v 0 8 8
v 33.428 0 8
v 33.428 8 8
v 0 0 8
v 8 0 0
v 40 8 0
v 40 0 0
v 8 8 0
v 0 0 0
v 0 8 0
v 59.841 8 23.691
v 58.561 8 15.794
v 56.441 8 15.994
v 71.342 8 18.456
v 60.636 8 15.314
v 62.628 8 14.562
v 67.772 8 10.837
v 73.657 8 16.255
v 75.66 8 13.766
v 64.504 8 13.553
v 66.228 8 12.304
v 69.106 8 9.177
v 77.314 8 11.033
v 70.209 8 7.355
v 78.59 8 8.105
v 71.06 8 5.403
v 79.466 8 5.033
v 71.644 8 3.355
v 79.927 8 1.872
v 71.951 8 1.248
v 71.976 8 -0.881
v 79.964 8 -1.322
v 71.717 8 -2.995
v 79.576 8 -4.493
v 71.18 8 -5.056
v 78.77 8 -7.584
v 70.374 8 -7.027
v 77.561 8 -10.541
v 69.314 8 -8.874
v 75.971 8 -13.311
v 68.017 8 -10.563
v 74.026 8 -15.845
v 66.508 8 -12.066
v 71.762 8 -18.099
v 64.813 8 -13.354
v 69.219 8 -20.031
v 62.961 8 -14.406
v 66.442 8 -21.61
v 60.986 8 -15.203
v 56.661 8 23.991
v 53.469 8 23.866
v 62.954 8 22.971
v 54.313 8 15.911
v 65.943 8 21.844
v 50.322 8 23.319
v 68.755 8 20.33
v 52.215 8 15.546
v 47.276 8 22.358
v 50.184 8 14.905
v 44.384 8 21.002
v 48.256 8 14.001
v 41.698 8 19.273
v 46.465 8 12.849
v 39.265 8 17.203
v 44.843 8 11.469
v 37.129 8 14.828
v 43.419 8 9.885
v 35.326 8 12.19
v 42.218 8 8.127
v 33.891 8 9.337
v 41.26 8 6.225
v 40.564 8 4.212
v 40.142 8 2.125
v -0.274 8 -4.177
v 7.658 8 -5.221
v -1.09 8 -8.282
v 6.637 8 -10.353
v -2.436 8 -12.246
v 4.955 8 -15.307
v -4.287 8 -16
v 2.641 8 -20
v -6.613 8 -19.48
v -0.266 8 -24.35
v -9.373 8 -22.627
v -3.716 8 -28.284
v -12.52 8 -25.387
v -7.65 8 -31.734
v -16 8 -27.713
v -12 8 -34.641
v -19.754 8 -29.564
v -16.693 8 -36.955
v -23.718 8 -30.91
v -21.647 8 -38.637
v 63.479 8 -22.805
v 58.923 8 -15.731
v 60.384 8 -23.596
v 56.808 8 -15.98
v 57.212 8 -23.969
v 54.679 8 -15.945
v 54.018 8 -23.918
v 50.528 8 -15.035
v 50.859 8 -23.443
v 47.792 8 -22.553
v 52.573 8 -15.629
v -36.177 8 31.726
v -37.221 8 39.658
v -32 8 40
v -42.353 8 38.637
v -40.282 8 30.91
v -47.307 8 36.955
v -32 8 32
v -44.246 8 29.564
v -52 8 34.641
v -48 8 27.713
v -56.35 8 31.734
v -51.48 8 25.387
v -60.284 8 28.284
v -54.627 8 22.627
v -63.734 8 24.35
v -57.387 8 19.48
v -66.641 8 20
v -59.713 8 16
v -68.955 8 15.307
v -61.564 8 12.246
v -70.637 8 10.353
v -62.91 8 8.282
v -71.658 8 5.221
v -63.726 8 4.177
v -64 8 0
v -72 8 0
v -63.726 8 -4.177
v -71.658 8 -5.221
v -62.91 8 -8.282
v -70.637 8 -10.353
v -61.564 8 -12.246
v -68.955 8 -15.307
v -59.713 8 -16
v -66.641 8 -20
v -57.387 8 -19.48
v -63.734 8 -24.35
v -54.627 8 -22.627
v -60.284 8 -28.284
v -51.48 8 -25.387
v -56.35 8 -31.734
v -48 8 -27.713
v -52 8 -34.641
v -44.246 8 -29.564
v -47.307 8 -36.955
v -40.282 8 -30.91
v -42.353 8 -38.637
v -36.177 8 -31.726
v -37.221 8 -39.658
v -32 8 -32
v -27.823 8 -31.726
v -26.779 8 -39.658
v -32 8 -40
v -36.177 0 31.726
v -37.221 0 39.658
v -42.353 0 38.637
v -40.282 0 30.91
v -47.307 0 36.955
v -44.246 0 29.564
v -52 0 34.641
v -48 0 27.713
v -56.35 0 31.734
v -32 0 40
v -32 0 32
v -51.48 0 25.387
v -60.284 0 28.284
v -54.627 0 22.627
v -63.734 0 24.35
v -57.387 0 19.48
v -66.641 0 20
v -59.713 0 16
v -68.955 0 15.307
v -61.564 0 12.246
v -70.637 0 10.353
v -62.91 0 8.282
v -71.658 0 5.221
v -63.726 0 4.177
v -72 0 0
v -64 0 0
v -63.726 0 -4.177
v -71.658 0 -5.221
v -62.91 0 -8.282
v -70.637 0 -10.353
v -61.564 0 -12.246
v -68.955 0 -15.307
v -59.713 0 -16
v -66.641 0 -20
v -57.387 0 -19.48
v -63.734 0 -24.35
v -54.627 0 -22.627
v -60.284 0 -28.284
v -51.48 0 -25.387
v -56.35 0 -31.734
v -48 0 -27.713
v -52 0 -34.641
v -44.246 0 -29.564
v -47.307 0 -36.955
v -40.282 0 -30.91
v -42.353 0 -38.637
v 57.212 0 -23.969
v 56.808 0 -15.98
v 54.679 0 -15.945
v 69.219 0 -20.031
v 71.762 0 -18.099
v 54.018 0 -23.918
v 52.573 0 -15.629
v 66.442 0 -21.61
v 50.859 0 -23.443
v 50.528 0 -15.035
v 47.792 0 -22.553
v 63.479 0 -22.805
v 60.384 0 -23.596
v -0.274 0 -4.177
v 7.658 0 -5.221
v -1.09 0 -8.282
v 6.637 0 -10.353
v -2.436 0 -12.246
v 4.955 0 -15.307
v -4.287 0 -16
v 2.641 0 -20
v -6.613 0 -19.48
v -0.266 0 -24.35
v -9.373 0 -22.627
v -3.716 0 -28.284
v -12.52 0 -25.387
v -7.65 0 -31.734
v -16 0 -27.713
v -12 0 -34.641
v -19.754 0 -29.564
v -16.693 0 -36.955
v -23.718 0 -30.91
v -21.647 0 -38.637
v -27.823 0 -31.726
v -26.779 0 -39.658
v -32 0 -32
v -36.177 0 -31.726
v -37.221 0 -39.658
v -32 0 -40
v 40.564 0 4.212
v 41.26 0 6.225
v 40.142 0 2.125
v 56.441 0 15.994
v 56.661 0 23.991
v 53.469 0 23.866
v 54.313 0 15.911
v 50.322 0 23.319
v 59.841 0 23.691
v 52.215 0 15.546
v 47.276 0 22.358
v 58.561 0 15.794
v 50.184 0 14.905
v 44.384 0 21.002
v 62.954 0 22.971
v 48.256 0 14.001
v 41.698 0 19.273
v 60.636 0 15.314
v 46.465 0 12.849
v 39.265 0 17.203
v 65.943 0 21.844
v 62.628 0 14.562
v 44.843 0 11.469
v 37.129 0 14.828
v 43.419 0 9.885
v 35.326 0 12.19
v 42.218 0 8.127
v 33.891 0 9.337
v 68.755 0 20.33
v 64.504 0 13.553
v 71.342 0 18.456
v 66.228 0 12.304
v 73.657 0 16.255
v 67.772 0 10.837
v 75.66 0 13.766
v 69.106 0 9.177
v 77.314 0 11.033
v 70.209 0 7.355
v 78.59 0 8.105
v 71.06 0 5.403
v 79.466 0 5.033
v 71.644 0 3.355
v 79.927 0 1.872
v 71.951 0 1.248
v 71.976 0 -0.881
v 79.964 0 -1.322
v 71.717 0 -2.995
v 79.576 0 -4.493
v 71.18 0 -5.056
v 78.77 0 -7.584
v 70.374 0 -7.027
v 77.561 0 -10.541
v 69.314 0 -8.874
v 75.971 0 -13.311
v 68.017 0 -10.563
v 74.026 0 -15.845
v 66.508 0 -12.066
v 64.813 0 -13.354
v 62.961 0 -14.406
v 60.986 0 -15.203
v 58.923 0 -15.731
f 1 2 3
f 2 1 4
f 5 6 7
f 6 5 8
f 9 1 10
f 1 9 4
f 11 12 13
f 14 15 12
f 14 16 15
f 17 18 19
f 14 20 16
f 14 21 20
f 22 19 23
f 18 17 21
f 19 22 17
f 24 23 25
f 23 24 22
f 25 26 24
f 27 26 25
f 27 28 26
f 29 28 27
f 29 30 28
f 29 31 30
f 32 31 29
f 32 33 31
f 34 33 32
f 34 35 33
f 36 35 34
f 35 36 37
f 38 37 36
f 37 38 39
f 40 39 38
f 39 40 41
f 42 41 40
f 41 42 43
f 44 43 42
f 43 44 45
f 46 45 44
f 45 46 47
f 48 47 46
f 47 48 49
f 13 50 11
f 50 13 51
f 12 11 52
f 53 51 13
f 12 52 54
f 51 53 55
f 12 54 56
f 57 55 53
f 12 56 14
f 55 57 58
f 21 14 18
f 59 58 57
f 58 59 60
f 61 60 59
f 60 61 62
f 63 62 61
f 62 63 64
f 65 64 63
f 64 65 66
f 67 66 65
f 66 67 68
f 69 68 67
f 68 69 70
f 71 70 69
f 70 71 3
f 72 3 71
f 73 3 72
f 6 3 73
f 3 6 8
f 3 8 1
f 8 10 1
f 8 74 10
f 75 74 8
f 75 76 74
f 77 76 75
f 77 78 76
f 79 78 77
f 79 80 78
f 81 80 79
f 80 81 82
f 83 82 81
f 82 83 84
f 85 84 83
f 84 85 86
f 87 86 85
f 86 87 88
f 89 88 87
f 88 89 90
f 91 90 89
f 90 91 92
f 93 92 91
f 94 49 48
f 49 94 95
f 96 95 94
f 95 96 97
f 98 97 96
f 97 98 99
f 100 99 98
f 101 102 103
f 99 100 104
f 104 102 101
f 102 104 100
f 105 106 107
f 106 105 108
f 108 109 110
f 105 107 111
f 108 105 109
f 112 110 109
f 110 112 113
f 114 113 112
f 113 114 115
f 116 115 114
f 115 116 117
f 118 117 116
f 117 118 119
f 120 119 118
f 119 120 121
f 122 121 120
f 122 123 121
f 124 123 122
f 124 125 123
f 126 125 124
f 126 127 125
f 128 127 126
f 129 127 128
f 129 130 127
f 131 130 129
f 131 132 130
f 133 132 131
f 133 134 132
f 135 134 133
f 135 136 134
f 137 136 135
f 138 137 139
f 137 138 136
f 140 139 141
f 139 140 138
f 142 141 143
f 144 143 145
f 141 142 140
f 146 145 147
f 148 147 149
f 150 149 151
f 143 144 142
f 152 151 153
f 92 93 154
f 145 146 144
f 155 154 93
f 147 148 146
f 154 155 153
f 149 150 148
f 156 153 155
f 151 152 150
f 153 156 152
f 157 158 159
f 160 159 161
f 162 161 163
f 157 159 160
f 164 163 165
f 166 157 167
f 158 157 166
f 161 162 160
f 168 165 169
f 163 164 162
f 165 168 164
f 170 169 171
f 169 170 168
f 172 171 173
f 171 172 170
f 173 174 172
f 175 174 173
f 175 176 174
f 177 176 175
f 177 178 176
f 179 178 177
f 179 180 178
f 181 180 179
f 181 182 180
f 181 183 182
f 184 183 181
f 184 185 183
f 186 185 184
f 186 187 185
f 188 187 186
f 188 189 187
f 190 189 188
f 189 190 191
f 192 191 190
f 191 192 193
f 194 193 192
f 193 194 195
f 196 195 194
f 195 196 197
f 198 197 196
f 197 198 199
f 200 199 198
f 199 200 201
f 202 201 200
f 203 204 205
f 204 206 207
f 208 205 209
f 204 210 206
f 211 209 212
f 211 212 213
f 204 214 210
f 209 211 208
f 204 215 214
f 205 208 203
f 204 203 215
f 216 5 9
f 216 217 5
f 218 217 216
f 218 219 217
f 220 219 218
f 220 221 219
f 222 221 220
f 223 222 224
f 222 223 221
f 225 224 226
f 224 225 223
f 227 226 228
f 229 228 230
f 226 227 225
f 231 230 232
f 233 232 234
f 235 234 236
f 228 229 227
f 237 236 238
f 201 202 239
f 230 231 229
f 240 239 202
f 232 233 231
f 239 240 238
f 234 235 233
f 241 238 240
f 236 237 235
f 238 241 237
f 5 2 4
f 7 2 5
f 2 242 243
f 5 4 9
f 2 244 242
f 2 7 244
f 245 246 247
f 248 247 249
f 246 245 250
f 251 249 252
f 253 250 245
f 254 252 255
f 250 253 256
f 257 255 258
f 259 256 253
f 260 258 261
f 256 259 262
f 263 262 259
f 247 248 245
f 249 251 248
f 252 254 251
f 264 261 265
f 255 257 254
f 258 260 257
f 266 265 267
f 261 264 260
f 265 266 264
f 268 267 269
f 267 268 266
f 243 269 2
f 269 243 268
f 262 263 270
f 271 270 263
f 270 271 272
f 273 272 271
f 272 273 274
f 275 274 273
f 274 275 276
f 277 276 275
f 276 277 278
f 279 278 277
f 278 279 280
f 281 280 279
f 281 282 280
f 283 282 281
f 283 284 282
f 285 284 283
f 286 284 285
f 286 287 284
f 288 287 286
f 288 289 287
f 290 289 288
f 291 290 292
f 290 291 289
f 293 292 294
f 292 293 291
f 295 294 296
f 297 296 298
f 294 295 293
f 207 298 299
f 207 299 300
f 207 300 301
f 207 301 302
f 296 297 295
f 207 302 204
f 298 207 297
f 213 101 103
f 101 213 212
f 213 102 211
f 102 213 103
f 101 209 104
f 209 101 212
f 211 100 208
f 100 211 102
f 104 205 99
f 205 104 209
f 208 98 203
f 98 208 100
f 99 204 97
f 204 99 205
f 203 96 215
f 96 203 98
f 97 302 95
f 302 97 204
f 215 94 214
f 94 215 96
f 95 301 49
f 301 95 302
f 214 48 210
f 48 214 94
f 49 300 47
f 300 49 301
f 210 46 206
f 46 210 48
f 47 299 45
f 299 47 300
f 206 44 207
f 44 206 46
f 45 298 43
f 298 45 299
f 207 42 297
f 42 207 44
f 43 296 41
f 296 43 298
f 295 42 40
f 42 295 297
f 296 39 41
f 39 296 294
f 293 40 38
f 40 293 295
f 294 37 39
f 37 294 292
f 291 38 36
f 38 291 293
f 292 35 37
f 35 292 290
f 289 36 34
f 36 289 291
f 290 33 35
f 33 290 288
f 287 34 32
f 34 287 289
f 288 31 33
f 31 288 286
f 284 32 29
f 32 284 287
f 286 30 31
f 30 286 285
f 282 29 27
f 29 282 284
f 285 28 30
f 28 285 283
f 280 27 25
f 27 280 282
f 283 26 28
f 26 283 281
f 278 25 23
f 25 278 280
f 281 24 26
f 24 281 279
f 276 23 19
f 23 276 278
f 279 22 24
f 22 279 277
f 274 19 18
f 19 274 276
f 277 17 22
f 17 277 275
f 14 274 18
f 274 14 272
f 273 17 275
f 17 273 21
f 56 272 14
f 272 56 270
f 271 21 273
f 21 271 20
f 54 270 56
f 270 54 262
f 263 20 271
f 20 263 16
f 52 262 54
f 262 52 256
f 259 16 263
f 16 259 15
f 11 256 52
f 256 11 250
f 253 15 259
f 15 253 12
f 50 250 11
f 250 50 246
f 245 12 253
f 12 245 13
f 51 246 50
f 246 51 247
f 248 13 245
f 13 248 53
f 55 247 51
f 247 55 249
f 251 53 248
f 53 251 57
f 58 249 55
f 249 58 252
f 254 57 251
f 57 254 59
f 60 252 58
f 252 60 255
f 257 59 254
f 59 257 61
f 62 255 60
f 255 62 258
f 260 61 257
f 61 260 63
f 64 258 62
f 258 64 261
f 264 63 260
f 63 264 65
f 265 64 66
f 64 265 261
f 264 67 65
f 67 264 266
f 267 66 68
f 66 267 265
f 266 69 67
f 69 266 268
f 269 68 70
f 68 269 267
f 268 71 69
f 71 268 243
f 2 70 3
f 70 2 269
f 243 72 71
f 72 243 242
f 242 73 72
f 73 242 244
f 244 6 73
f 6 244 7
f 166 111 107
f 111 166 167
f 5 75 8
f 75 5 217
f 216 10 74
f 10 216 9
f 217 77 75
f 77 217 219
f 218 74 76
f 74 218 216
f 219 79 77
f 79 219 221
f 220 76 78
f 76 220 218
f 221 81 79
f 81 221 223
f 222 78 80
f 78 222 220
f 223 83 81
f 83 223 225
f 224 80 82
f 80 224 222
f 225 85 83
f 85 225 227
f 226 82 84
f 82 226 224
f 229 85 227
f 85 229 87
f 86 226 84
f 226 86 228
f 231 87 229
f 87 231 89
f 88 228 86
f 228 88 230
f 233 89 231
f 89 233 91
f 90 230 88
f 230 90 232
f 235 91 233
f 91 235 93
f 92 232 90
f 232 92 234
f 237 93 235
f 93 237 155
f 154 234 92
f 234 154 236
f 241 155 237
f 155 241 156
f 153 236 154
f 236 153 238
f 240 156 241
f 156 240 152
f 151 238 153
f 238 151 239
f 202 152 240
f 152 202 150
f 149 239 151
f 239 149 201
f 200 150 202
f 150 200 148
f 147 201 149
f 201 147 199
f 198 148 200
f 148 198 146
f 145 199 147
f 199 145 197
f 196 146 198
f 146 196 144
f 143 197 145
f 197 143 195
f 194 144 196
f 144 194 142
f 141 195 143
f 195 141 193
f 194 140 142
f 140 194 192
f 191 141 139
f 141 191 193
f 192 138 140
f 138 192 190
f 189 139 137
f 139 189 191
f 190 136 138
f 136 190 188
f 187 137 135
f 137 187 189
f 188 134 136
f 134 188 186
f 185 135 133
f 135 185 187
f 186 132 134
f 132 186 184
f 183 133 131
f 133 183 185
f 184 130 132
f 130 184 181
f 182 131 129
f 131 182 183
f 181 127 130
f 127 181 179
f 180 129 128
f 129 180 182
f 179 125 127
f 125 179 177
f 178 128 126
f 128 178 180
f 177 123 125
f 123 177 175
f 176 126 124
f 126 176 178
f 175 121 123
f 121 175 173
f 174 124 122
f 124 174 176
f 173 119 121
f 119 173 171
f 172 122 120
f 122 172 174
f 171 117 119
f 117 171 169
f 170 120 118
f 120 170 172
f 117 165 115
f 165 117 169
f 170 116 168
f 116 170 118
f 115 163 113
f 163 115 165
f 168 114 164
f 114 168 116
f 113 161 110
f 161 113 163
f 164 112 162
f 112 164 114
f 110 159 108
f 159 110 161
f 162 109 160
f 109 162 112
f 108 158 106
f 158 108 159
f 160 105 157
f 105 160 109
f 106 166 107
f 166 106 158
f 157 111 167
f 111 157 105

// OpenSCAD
$fn = 48;


union() {
	translate(v = [0, 0, 0]) {
		cube(size = [40, 8, 8]);
	}
	translate(v = [56, 8, 0]) {
		rotate(a = [90, 110, 0]) {
			rotate_extrude(angle = 290) {
				translate(v = [16, 0, 0]) {
					square(size = 8);
				}
			}
		}
	}
	translate(v = [-32, 0, 0]) {
		rotate(a = [90, 180, 180]) {
			rotate_extrude(angle = 270) {
				translate(v = [32, 0, 0]) {
					square(size = 8);
				}
			}
		}
	}
}
